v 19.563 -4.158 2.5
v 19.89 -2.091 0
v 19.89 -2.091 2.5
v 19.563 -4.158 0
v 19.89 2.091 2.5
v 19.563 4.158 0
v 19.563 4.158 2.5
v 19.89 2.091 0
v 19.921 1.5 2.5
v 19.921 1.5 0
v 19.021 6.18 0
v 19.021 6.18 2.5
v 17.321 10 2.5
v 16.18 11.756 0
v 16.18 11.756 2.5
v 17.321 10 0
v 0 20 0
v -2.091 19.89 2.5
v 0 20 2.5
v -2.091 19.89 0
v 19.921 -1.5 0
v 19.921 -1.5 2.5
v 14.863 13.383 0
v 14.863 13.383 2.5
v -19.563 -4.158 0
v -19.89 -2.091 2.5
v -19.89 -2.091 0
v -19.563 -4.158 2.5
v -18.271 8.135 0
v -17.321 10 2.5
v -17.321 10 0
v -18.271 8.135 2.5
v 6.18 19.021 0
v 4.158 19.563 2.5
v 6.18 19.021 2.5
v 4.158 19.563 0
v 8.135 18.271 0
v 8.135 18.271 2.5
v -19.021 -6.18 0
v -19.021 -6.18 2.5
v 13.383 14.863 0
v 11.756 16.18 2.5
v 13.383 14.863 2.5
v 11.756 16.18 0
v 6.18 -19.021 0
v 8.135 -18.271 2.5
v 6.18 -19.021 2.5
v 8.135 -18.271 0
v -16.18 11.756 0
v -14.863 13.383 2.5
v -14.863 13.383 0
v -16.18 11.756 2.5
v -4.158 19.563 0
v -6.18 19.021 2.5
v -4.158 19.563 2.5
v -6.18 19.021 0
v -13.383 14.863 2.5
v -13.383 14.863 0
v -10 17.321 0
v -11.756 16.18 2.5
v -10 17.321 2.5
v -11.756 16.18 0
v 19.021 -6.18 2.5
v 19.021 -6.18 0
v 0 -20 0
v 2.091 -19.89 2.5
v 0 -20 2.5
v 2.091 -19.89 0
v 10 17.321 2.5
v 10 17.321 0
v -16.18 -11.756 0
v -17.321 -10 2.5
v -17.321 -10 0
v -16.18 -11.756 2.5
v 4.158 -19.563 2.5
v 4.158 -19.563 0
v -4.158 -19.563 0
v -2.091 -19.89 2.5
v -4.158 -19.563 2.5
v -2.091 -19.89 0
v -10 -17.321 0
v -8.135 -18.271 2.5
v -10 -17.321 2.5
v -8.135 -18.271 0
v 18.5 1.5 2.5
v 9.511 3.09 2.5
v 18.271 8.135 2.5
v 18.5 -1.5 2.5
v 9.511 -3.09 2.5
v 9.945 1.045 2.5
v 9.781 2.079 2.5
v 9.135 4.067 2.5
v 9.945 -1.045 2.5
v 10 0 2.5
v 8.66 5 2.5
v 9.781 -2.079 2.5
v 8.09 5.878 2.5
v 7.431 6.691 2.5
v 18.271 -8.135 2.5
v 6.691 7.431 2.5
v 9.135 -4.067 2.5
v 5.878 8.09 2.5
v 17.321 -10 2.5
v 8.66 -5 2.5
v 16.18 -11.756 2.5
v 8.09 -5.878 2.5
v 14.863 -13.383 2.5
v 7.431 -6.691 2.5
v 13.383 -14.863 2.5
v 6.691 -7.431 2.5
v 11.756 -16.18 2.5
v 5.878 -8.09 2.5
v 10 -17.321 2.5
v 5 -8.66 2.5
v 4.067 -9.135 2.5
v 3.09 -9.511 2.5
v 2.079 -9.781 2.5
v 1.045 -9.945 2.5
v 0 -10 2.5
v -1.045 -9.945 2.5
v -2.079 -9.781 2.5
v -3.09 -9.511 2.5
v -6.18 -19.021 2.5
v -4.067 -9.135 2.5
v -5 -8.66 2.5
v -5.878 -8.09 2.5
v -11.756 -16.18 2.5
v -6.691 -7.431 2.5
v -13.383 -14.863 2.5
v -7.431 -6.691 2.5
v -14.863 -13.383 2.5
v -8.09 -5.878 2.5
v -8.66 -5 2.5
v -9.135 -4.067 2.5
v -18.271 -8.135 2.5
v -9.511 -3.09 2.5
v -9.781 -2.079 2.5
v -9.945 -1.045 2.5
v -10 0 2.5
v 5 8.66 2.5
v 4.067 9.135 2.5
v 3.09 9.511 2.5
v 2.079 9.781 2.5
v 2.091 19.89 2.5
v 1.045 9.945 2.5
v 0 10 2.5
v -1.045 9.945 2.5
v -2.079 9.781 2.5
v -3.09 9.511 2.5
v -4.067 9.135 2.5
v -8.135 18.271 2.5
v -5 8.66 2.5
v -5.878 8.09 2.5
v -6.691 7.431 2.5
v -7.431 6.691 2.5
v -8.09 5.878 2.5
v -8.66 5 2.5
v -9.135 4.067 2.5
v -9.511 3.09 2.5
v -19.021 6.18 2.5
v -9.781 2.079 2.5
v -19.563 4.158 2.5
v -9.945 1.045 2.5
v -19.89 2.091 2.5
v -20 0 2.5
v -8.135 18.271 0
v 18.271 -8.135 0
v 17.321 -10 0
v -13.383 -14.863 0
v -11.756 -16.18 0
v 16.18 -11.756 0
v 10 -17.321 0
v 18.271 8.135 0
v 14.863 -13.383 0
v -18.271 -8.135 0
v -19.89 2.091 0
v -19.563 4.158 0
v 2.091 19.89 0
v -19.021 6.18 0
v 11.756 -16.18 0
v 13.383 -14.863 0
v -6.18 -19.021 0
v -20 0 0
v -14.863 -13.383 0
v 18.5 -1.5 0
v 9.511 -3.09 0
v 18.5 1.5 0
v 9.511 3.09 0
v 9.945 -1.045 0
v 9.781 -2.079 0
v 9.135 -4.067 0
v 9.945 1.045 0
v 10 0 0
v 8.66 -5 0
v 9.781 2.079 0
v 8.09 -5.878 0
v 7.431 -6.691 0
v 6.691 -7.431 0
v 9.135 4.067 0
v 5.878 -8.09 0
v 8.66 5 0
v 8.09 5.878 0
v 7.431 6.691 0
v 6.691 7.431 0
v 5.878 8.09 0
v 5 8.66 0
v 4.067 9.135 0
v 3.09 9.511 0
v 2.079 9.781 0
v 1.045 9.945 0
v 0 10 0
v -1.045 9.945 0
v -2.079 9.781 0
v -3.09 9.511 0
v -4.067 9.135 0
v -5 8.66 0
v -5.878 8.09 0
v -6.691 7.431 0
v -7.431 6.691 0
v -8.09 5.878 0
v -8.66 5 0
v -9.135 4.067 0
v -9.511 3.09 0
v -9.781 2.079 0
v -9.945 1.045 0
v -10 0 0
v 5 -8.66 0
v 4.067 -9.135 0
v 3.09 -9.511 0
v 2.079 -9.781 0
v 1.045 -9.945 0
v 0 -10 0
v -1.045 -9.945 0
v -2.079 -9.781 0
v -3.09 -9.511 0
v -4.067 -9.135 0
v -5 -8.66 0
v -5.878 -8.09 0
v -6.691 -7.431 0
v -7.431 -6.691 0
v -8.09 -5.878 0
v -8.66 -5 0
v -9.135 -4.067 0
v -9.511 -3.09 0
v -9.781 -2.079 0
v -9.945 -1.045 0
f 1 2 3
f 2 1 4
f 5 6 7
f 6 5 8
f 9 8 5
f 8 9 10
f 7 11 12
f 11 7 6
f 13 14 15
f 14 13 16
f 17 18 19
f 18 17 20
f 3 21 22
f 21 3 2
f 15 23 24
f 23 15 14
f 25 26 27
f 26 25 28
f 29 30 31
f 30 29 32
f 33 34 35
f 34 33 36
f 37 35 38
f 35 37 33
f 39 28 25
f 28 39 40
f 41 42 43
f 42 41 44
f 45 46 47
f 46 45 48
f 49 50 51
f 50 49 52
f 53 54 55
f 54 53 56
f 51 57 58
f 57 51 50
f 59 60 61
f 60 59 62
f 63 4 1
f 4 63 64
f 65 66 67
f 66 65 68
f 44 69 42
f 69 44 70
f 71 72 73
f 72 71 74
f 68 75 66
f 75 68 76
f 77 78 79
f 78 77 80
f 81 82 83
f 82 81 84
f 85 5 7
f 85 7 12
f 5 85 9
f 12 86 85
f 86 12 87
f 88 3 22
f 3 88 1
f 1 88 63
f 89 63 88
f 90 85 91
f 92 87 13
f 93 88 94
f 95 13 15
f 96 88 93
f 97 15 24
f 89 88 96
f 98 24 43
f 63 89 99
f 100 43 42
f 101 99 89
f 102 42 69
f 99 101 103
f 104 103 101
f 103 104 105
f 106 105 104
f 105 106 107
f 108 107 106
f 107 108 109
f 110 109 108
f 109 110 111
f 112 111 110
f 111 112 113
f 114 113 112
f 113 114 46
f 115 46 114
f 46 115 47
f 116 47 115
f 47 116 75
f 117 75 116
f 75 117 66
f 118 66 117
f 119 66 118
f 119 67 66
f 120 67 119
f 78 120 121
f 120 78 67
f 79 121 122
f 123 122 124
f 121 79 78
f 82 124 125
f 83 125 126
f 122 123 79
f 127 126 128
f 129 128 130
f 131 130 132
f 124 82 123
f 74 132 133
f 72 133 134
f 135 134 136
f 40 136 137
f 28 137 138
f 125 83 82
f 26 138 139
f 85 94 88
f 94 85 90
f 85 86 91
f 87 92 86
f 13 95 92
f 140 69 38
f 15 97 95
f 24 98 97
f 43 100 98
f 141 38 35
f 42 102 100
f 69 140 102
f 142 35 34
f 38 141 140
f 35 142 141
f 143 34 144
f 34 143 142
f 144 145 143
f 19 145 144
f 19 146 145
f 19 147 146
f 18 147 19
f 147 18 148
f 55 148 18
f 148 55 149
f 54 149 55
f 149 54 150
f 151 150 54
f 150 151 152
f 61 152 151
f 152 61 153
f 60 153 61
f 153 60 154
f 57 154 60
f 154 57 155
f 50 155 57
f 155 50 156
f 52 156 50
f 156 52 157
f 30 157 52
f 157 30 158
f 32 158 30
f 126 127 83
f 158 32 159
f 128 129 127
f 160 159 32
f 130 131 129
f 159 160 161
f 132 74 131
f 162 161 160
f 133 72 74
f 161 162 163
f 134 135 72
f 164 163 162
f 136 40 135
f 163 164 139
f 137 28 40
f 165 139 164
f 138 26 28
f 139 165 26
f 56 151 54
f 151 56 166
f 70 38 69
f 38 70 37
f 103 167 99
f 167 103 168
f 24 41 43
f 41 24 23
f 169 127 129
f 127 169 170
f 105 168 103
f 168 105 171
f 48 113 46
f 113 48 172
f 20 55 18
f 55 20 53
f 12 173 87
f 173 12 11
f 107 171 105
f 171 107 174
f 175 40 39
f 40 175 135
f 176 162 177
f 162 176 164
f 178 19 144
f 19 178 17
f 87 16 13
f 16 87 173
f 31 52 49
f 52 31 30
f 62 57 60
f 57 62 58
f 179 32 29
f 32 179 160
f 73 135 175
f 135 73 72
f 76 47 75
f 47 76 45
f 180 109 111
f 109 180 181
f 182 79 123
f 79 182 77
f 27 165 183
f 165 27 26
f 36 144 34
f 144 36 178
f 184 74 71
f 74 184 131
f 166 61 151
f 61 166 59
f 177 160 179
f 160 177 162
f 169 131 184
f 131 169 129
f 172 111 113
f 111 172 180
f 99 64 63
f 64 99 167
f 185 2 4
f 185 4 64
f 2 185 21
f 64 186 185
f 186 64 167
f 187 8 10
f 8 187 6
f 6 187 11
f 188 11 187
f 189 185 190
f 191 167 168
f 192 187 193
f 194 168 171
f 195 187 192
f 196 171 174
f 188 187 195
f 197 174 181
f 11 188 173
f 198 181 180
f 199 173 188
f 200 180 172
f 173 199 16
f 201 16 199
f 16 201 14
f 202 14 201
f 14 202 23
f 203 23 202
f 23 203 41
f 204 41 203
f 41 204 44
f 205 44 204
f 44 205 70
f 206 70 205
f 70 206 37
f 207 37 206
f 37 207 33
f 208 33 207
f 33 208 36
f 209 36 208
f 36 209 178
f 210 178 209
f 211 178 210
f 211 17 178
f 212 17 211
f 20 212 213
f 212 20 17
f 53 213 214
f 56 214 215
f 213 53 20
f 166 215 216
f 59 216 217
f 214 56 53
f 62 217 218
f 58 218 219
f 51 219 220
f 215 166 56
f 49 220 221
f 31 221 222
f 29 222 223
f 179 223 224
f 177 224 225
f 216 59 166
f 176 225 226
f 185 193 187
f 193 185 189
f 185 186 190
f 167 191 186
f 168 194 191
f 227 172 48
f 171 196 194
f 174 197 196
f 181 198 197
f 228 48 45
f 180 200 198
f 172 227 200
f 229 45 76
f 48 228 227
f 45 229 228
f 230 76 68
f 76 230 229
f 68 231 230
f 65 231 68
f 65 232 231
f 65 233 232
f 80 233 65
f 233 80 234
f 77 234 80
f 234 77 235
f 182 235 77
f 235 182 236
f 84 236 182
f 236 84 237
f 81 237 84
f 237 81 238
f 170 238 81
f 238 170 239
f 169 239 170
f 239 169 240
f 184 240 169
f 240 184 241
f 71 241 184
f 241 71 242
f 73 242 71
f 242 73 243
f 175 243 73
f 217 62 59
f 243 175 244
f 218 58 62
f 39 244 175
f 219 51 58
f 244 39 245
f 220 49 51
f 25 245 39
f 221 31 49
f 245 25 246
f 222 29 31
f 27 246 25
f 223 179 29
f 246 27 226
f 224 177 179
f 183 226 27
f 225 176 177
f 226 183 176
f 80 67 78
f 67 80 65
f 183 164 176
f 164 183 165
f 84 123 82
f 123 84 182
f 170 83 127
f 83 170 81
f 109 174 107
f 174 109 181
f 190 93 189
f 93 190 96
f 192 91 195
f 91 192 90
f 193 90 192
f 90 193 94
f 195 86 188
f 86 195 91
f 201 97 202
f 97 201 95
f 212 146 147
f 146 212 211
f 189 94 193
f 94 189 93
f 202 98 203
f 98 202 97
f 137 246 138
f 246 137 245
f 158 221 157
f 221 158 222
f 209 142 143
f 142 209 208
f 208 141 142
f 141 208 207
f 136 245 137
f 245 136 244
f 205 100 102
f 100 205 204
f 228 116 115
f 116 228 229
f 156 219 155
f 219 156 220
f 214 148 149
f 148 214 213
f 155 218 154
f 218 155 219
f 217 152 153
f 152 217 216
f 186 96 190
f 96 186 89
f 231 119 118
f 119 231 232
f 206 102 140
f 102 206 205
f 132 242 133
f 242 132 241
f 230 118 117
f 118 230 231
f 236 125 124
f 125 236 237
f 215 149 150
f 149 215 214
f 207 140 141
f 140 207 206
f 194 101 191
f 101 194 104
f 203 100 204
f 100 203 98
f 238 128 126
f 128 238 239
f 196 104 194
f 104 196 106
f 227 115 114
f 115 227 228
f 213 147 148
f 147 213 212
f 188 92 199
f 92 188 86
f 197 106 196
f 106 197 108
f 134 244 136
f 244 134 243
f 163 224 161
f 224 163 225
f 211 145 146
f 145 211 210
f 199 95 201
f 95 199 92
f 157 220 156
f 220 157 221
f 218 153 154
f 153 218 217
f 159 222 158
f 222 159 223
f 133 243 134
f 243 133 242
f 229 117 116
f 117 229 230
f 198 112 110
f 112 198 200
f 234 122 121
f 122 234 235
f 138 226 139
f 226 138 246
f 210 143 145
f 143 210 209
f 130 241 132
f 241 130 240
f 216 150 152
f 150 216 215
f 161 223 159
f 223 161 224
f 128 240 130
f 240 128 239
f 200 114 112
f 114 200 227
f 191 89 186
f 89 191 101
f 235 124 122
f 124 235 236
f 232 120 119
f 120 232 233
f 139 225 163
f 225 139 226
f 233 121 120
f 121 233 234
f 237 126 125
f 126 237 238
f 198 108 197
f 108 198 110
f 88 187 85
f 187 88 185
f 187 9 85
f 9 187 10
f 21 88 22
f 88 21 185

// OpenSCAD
// External retaining ring with installation gap.
$fn = 60;
eps = 0.02;
shaft_d = 20;
outer_d = 40;
thickness = 2.5;
gap = 3;
difference() {
    cylinder(d = outer_d, h = thickness);
    translate([0, 0, -eps]) cylinder(d = shaft_d, h = thickness + 2 * eps);
    translate([outer_d / 2 - gap / 2, -gap / 2, -eps]) cube([gap + eps, gap, thickness + 2 * eps]);
}
